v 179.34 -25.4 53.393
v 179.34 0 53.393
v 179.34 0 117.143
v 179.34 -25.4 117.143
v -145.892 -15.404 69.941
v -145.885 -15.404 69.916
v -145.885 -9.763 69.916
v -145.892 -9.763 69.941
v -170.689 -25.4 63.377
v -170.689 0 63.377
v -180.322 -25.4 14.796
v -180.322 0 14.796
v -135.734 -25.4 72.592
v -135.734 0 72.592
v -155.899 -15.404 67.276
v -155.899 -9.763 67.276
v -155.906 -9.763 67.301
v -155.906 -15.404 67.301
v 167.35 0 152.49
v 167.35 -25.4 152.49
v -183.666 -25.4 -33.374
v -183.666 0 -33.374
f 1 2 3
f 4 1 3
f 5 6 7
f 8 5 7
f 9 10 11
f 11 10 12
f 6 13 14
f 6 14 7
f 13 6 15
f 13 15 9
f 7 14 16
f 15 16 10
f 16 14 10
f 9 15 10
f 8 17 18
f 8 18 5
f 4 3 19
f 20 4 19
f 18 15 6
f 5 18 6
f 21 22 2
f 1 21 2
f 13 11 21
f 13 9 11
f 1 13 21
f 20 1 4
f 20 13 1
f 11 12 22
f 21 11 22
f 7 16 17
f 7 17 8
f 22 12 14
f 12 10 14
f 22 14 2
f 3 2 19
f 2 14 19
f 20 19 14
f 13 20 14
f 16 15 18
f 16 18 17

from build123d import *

# Parameters (mm, degrees)
F1_DEPTH = 25.4
F2_W     = 10.3561803699
F2_H     = 5.641033873
F3_DEPTH = 0.0254


with BuildPart() as f1:
    # F0 (on Front) → F1 (new body)
    with BuildSketch(Plane.XZ):
        Polygon((-180.321587468, 14.7963562756), (-183.6662888527, -33.3735458553), (179.340466857, 53.3933117986), (179.340466857, 117.1431019902), (131.396189332, 143.0117189884), (-135.7338540163, 72.5921073616), (-170.688867569, 63.3774250746), align=None)
        Polygon((131.396189332, 143.0117189884), (179.340466857, 117.1431019902), (167.3504786853, 152.4898258342), align=None)
    extrude(amount=F1_DEPTH)

    # F2 (on face) → F3 (join)
    with BuildSketch(Plane(origin=(-26.7126271231, 0, 101.331789206), x_dir=(0.9669655535, 0, 0.2549070778), z_dir=(-0.2549070778, 0, 0.9669655535))):
        with Locations((-128.4218169749, -12.583672069)):
            Rectangle(F2_W, F2_H)
    extrude(amount=F3_DEPTH)


solid = f1.part
